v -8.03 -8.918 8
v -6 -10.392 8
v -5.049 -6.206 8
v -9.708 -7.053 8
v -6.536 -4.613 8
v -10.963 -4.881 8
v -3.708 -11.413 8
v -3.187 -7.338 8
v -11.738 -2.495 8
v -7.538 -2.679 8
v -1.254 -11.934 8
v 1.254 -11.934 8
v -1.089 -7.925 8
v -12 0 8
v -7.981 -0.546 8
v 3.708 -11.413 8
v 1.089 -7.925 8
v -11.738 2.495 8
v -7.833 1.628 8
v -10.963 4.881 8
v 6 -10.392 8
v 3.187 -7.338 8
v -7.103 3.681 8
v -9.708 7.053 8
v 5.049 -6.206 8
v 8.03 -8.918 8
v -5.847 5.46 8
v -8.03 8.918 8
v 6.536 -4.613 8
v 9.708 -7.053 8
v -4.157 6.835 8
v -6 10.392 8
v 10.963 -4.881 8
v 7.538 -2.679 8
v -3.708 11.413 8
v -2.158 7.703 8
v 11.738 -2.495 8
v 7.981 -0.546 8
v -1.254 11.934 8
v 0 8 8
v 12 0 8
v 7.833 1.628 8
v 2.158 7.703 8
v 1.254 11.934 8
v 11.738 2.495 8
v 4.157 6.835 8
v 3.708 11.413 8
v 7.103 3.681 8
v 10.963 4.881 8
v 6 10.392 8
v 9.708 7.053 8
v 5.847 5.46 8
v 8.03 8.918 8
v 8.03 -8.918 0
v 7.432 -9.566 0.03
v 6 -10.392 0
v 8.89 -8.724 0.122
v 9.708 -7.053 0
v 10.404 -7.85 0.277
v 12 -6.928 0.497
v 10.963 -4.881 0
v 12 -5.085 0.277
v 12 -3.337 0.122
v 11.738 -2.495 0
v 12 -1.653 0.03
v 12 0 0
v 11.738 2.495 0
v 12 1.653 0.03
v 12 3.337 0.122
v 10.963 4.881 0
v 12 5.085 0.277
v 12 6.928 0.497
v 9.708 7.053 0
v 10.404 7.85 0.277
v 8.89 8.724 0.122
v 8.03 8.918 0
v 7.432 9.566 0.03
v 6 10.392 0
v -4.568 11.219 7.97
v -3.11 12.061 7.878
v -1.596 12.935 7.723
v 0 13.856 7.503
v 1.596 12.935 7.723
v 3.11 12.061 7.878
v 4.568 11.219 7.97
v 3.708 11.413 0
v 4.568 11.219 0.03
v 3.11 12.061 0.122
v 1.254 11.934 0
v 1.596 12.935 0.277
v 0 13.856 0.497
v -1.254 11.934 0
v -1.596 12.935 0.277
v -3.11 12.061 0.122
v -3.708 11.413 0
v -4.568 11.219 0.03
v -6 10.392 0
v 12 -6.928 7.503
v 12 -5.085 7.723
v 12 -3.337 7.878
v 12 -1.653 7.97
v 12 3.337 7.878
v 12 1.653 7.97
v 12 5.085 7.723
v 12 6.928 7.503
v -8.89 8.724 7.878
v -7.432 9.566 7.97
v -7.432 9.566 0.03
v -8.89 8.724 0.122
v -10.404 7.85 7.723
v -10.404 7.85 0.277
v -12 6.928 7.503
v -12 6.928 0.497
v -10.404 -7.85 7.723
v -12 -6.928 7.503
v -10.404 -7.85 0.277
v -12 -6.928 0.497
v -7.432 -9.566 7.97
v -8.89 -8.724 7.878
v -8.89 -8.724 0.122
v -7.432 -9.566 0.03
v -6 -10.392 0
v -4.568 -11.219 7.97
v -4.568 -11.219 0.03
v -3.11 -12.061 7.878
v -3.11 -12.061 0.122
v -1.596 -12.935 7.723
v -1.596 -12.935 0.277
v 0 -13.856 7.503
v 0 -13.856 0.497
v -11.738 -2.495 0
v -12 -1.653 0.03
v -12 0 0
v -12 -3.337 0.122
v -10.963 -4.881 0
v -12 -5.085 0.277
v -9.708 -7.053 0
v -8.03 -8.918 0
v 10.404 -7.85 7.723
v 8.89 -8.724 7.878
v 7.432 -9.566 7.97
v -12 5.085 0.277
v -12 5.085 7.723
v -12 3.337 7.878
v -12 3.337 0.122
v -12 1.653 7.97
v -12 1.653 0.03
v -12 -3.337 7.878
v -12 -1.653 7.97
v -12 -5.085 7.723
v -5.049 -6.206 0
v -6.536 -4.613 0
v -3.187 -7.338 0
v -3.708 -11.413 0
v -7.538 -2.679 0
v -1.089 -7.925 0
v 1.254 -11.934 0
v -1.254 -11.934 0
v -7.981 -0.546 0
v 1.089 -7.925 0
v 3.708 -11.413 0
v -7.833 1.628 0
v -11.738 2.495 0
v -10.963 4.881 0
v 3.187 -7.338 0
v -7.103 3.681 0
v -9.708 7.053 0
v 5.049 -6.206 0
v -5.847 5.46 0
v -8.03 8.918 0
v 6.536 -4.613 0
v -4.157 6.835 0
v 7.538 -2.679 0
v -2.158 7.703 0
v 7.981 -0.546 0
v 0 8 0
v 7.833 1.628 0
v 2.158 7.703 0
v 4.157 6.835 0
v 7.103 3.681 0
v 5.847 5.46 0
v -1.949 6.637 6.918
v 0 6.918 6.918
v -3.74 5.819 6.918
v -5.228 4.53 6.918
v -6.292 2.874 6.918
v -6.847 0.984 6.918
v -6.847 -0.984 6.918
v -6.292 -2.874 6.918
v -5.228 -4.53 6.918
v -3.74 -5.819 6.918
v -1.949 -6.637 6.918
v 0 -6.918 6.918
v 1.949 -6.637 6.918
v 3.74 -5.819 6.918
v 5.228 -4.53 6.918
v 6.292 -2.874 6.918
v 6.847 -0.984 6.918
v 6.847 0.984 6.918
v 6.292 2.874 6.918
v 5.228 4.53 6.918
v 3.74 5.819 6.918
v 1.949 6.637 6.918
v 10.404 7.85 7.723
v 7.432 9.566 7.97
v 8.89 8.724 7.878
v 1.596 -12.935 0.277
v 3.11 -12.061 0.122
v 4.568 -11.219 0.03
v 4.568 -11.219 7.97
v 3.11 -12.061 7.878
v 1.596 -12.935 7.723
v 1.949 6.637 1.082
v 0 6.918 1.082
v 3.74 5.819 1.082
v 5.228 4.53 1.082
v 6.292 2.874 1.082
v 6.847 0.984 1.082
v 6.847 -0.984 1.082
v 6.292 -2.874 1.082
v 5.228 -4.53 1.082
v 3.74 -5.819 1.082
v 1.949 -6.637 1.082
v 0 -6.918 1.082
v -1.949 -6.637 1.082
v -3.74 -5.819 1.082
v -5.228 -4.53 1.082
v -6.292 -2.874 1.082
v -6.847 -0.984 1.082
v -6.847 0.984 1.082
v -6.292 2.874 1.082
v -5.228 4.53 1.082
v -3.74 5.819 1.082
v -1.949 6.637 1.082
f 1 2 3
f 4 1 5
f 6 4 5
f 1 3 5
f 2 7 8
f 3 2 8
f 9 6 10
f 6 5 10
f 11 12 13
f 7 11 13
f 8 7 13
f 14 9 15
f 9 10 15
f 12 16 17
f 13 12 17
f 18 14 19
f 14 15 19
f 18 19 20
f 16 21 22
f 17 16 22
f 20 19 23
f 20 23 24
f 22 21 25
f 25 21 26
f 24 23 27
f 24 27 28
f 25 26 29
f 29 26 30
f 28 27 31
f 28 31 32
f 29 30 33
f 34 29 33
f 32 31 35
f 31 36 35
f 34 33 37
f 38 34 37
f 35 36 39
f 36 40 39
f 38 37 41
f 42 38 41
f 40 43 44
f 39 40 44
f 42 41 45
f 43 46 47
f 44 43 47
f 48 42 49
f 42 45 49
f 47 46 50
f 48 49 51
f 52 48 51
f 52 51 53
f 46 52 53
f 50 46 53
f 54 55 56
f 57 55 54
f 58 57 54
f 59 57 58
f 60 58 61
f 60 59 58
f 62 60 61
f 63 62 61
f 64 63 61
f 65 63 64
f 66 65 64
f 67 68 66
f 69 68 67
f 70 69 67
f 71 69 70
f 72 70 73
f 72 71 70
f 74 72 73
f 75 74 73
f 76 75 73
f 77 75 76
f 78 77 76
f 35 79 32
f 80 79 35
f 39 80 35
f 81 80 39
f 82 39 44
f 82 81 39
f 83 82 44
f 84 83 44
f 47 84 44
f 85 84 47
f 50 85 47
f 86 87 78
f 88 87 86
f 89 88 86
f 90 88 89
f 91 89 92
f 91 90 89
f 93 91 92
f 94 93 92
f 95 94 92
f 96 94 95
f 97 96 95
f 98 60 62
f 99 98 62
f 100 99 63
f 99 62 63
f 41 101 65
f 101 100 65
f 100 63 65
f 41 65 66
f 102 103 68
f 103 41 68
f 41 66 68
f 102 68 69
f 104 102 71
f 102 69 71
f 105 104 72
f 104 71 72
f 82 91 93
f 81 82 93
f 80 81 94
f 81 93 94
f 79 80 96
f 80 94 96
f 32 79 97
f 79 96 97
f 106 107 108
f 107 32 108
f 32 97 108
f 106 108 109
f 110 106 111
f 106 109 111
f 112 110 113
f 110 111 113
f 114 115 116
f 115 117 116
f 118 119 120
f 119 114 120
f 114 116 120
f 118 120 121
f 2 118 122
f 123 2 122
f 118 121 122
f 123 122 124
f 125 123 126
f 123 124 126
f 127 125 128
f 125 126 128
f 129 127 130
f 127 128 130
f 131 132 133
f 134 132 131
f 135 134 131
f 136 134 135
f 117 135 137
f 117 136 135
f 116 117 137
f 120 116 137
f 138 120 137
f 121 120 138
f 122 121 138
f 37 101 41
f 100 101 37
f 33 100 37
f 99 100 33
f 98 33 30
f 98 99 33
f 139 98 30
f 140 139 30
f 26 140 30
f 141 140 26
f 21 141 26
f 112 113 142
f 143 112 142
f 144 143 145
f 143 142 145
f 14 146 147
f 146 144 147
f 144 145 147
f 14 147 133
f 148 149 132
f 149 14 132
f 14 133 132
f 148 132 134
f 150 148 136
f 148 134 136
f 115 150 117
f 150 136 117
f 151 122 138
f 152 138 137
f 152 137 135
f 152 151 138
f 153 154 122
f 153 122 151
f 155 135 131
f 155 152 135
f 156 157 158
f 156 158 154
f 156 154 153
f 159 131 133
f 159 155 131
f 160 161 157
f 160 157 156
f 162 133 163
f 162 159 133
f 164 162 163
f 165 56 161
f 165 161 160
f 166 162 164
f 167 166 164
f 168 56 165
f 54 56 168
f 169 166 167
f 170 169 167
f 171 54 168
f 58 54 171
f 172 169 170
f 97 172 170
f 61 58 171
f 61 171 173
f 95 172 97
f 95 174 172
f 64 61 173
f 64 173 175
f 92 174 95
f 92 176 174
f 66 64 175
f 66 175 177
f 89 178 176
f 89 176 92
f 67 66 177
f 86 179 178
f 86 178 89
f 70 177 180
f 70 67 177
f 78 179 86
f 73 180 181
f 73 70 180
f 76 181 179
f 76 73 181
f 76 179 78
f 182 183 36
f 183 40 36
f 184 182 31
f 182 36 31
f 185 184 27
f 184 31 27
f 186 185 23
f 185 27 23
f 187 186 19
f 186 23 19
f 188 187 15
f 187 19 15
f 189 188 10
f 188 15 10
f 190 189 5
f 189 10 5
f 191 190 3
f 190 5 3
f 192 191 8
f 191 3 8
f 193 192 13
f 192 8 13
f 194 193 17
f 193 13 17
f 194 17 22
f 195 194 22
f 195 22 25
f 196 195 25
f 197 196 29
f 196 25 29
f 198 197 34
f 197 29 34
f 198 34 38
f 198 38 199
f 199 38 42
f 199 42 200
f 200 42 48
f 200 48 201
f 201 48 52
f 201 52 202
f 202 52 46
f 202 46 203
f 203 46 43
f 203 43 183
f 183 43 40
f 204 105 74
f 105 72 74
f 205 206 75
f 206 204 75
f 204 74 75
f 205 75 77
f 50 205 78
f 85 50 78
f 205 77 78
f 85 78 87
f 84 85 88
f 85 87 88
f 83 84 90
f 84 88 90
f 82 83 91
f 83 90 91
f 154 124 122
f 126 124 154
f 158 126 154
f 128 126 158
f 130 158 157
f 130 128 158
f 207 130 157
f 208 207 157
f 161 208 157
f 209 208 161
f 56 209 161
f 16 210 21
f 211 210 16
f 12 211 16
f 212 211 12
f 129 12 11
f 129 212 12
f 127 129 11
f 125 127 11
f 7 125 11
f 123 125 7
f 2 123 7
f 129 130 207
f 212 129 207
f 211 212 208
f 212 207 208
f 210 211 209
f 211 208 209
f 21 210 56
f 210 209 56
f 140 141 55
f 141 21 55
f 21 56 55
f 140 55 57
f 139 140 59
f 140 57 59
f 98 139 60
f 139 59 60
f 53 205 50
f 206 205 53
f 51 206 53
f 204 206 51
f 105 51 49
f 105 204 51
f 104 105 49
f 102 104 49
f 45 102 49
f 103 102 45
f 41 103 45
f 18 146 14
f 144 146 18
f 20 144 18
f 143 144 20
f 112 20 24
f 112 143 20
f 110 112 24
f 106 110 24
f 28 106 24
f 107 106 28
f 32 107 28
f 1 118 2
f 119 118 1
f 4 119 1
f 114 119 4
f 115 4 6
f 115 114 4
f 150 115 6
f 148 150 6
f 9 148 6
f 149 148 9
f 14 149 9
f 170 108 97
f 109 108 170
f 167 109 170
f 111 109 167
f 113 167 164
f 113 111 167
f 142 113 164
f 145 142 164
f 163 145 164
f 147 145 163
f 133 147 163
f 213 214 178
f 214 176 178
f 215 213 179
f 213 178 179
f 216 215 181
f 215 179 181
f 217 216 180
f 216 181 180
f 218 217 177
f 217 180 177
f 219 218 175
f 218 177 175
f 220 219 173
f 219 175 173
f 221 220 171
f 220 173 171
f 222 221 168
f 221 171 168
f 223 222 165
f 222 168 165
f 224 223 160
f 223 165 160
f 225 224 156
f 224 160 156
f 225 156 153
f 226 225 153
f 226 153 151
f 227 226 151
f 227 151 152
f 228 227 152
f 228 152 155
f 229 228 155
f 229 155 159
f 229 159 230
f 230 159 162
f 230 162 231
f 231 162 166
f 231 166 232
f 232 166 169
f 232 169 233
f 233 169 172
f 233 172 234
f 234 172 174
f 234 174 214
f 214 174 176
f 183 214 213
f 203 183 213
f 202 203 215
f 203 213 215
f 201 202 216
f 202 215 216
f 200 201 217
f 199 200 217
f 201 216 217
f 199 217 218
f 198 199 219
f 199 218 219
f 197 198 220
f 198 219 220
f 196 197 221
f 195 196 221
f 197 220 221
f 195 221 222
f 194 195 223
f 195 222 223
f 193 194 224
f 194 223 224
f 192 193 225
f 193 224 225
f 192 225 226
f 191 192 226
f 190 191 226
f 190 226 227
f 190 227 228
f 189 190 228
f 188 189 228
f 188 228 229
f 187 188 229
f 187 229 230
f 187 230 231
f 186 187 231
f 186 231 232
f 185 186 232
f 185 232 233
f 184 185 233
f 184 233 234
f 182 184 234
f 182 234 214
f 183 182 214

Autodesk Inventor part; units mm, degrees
sketch "Sketch_3" plane through (0, 0, 0) normal (1, 0, 0) x (0, 0, -1)
  line L0 (0, 0) -> (-8, 0)
  line L1 (-8, 0) -> (-8, 12)
  line L2 (-8, 12) -> (-7.3569, 14.4)
  line L3 (-7.3569, 14.4) -> (-0.6431, 14.4)
  line L4 (-0.6431, 14.4) -> (0, 12)
  line L5 (0, 12) -> (0, 0)
  line L6 (0, 0) -> (-8, 0)
revolve "Revolution1" add sketch "Sketch_3" angle 360 about axis through (0, 0, 0) along (0, 0, -1)
sketch "Sketch_2" plane through (0, 0, 0) normal (1, 0, 0) x (0, 0, -1)
  line L0 (0, 0) -> (-8, 0)
  line L1 (-8, 0) -> (-8, 8)
  line L2 (-8, 8) -> (-6.9175, 6.9175)
  line L3 (-6.9175, 6.9175) -> (-1.0825, 6.9175)
  line L4 (-1.0825, 6.9175) -> (0, 8)
  line L5 (0, 8) -> (0, 0)
  line L6 (0, 0) -> (-8, 0)
revolve "Revolution2" cut sketch "Sketch_2" angle 360 about axis through (0, 0, 0) along (0, 0, -1)
thread "Thread1" size "M16x2" class "6H" standard "ISO Metric profile" full length
sketch "Sketch_1" plane through (0, 0, 0) normal (0, 0, 1) x (1, 0, 0)
  line L0 (-24, -24) -> (24, -24)
  line L1 (24, -24) -> (24, 24)
  line L2 (24, 24) -> (-24, 24)
  line L3 (-24, 24) -> (-24, -24)
  line L4 (-12, -6.9282) -> (0, -13.8564)
  line L5 (0, -13.8564) -> (12, -6.9282)
  line L6 (12, -6.9282) -> (12, 6.9282)
  line L7 (12, 6.9282) -> (0, 13.8564)
  line L8 (0, 13.8564) -> (-12, 6.9282)
  line L9 (-12, 6.9282) -> (-12, -6.9282)
extrude "Extrusion1" cut sketch "Sketch_1" along normal blind 8
ref_plane "MUTTER_XY" through (0, 0, 0) normal (0, 0, 1) x (1, 0, 0)
ref_plane "MUTTER_YZ" through (0, 0, 0) normal (1, 0, 0) x (0, 1, 0)
ref_plane "MUTTER_ZX" through (0, 0, 0) normal (0, 1, 0) x (0, 0, 1)
properties part number "SLZ_63_Mutter_M16#"
